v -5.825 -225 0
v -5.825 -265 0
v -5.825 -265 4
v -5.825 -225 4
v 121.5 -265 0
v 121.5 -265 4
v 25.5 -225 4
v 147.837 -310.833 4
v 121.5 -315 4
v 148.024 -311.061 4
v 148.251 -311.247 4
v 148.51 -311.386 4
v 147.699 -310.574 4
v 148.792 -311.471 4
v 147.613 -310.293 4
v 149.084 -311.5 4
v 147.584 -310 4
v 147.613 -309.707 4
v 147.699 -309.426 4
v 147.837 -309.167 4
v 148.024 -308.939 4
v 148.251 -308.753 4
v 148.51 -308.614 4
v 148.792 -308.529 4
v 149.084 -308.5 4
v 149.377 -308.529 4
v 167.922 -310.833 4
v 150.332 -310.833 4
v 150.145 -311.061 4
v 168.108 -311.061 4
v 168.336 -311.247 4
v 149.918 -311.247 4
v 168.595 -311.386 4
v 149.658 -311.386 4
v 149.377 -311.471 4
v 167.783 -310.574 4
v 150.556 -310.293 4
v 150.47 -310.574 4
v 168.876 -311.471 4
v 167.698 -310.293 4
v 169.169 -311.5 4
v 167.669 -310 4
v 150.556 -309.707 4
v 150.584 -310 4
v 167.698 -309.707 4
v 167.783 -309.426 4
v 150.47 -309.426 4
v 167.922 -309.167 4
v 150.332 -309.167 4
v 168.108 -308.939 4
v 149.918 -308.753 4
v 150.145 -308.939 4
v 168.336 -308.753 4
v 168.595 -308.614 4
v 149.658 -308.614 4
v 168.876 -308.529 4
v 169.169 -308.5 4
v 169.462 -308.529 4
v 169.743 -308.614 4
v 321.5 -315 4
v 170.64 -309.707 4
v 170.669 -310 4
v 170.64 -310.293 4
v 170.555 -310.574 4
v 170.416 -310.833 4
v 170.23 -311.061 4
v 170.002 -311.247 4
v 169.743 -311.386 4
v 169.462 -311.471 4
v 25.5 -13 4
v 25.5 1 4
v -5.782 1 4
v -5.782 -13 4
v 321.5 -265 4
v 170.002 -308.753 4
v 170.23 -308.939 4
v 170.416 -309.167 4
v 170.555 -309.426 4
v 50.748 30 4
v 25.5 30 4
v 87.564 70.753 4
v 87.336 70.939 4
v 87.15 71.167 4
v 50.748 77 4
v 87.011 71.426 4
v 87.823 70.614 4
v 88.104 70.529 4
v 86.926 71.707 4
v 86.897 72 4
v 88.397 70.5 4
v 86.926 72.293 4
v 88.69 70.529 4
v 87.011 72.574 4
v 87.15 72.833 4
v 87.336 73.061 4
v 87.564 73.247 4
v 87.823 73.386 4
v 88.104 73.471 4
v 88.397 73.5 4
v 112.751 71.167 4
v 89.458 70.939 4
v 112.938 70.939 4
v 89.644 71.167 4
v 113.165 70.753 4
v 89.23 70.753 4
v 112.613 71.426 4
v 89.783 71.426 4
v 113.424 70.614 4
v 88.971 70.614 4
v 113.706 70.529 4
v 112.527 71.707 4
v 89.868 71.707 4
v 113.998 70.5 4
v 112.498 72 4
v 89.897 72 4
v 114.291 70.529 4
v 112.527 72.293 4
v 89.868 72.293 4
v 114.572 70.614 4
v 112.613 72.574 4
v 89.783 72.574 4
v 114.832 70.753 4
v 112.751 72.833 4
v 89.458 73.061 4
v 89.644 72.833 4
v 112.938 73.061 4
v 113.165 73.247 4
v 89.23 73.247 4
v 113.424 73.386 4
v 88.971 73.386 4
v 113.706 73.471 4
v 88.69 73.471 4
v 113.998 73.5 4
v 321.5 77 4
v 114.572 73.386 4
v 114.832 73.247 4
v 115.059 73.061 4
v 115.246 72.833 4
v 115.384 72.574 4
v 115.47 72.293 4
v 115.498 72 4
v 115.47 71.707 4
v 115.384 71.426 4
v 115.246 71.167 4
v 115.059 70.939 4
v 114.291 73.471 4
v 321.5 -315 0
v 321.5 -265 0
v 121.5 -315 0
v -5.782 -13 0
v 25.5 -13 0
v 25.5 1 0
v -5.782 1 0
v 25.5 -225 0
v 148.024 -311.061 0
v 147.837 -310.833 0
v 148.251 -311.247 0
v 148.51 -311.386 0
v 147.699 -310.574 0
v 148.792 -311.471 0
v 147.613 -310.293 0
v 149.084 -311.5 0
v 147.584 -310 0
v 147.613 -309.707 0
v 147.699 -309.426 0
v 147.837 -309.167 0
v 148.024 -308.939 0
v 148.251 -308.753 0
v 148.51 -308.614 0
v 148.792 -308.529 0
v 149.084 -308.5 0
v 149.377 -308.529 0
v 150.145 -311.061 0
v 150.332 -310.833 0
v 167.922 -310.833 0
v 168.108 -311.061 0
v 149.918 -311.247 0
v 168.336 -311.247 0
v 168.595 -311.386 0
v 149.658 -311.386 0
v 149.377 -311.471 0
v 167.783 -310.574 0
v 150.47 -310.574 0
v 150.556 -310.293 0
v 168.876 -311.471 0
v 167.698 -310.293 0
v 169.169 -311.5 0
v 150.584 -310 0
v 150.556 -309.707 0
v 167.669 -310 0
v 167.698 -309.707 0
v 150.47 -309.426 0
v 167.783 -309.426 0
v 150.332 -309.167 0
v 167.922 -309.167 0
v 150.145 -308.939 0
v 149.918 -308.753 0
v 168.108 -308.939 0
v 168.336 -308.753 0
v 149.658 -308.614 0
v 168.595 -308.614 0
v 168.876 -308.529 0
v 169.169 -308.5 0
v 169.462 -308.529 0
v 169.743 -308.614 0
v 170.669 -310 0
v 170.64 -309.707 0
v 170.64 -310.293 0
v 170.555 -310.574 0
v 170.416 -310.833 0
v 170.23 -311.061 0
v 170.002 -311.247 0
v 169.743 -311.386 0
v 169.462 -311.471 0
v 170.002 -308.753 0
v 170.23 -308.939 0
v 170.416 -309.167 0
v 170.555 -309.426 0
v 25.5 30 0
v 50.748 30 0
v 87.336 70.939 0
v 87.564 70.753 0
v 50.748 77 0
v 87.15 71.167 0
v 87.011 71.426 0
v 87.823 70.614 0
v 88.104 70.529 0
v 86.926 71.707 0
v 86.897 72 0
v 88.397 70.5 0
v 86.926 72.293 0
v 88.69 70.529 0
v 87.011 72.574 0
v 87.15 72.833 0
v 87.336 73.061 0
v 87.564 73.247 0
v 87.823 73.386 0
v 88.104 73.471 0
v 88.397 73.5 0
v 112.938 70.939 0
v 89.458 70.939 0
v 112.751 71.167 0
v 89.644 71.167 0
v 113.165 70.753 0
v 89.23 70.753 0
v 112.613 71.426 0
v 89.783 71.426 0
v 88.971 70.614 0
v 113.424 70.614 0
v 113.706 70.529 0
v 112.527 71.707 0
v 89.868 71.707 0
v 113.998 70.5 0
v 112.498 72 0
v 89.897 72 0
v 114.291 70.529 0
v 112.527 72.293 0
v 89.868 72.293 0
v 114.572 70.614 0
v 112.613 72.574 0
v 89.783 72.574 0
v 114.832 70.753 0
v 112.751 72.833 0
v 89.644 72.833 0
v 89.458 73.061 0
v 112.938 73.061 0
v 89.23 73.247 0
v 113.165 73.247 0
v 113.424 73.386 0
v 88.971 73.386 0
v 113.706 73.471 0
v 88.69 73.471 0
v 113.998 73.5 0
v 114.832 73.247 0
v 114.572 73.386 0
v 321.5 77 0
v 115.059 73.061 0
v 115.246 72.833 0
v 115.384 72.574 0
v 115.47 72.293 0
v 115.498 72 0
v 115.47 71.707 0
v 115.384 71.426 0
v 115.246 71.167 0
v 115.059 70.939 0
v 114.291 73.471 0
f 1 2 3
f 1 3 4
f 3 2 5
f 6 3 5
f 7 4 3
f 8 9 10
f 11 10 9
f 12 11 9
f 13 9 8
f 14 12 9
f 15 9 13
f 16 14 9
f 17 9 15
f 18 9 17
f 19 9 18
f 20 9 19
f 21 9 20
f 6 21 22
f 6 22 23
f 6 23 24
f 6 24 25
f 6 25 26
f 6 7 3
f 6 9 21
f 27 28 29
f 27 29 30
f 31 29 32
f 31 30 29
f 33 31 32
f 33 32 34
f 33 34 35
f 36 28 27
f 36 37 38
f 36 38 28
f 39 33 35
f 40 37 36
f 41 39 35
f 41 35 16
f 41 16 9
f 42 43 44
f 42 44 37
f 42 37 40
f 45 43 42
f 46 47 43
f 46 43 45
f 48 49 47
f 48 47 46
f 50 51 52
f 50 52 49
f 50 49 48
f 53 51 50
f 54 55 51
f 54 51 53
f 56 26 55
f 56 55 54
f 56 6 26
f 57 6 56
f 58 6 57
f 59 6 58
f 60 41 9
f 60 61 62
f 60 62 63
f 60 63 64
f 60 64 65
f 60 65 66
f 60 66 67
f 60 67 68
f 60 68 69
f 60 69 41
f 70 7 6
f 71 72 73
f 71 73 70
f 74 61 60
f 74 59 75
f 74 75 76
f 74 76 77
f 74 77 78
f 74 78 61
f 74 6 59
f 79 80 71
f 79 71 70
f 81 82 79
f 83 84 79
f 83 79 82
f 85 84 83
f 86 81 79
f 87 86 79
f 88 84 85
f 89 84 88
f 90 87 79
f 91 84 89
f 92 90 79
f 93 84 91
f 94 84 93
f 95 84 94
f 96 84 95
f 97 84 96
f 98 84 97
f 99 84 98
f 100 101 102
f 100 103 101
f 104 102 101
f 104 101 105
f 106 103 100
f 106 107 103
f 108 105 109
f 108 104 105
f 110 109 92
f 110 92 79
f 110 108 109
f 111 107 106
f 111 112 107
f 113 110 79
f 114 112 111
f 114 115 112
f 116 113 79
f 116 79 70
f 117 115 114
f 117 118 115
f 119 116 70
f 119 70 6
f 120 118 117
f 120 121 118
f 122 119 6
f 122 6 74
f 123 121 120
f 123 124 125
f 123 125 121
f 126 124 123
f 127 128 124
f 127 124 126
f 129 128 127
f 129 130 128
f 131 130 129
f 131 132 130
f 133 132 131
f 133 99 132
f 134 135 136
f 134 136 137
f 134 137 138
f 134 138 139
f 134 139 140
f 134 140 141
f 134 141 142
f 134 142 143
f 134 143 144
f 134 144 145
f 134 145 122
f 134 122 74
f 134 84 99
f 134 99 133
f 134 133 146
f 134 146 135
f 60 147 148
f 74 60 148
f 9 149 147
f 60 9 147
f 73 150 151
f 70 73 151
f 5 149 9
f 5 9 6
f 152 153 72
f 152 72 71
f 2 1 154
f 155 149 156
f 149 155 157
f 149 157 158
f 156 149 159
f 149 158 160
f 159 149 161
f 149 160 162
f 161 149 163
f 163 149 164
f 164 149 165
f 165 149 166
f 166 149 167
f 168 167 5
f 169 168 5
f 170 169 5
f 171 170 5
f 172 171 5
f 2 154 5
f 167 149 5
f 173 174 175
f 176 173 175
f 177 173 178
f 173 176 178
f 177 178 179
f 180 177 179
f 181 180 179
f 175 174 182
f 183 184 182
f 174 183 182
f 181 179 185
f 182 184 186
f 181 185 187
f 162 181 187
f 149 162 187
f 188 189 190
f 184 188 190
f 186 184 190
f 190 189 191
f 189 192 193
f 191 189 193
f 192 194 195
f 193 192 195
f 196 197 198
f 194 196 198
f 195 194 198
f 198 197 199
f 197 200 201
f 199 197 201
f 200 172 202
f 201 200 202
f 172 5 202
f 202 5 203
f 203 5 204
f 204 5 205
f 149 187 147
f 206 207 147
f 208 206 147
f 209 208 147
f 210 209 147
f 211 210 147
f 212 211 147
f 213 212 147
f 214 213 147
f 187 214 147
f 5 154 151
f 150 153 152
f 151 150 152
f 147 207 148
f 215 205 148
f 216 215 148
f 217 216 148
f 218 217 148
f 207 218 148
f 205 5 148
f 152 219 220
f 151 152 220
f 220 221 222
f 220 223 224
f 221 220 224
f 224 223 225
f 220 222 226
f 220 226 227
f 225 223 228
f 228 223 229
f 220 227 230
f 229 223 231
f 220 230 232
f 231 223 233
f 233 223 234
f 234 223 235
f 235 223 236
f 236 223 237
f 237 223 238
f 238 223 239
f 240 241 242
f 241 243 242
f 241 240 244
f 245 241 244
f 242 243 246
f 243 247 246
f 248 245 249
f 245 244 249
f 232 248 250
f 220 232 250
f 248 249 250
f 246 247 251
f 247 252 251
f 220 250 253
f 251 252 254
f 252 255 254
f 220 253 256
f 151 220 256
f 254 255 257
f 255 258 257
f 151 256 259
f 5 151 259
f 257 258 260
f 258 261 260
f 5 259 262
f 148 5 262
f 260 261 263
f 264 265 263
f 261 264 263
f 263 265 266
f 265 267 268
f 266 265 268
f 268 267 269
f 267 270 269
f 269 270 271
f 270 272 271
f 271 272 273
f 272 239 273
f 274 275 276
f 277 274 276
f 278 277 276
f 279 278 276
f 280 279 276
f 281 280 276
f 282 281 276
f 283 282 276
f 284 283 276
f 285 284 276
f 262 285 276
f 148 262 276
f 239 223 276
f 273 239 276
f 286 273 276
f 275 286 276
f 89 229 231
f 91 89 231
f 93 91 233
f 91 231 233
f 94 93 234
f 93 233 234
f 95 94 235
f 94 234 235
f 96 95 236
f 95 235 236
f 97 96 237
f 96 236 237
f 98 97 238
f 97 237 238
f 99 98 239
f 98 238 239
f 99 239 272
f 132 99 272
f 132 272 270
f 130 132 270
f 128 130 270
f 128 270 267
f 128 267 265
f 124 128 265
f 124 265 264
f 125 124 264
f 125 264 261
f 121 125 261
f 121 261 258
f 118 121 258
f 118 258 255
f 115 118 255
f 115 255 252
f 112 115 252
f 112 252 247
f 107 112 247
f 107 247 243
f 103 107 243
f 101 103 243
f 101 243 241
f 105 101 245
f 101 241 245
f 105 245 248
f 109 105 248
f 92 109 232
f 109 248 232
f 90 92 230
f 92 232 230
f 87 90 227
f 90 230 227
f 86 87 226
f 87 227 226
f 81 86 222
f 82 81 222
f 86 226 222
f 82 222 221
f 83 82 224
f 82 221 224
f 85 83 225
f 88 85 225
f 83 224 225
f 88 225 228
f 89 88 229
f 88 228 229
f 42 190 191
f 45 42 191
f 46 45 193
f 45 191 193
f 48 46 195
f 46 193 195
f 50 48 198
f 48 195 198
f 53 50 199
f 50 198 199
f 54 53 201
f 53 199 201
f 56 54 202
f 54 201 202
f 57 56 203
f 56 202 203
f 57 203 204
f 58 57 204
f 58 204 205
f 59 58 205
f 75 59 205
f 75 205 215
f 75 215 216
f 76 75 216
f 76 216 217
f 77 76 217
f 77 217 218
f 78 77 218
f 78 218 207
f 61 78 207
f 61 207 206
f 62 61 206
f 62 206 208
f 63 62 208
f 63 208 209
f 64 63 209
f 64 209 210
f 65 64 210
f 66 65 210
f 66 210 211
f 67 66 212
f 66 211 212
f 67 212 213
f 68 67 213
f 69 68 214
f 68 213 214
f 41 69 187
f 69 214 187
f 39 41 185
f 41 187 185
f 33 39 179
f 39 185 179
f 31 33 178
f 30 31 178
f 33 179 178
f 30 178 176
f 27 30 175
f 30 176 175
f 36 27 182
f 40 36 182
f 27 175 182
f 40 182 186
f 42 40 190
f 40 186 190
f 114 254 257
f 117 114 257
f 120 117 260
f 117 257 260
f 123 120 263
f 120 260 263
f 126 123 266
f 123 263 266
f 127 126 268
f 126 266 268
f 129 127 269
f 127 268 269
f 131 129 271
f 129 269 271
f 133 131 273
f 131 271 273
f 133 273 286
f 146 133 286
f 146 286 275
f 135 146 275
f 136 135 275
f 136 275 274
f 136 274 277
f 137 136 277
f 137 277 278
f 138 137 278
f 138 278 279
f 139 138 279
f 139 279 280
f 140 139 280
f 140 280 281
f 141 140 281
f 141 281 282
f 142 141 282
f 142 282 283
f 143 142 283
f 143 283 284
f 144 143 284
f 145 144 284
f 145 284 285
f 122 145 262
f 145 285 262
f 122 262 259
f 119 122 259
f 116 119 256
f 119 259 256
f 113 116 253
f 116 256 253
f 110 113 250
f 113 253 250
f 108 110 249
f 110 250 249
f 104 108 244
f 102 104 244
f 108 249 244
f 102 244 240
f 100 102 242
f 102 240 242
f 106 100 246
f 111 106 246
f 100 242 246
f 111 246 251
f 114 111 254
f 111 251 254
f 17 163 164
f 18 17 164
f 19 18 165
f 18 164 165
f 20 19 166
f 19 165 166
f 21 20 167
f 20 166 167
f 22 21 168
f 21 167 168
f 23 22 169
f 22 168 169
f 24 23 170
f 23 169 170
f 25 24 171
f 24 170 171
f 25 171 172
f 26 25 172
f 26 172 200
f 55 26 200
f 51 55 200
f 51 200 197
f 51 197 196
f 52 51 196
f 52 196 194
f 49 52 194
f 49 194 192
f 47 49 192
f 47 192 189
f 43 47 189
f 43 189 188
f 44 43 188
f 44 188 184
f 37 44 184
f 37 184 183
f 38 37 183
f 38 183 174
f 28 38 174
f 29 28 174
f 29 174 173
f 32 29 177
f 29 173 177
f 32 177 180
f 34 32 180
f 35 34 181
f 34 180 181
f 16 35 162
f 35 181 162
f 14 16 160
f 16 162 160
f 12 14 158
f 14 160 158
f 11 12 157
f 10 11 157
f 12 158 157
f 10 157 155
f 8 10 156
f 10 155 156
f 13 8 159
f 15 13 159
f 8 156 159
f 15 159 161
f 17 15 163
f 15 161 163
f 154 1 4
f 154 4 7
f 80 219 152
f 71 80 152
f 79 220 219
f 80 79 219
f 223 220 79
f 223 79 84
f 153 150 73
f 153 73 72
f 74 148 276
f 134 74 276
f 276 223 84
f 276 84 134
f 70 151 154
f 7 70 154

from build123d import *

# Parameters (mm, degrees)
SKETCH1_W           = 31.282297403
SKETCH1_H           = 14
SKETCH1_W_2         = 31.32455923
SKETCH1_H_2         = 40
SKETCH1_W_3         = 270.751882141
SKETCH1_H_3         = 47
SKETCH1_W_4         = 200
SKETCH1_H_4         = 50
BOSS_EXTRUDE1_DEPTH = 4
SKETCH2_R           = 1.5
CUT_EXTRUDE1_DEPTH  = 451.114707602


with BuildPart() as part:
    # Sketch1 → Boss-Extrude1 (new body)
    with BuildSketch(Plane.XY):
        Polygon((25.5, 1), (25.5, -13), (25.5, -225), (25.5, -265), (65.632913627, -265), (121.5, -265), (321.5, -265), (321.5, 30), (50.748117859, 30), (25.5, 30), align=None)
        with Locations((9.858851298, -6)):
            Rectangle(SKETCH1_W, SKETCH1_H)
        with Locations((9.837720385, -245)):
            Rectangle(SKETCH1_W_2, SKETCH1_H_2)
        with Locations((186.124058929, 53.5)):
            Rectangle(SKETCH1_W_3, SKETCH1_H_3)
        with Locations((221.5, -290)):
            Rectangle(SKETCH1_W_4, SKETCH1_H_4)
    extrude(amount=BOSS_EXTRUDE1_DEPTH)

    # Sketch2 → Cut-Extrude1 (cut, through all)
    with BuildSketch(Plane(origin=(0, 0, 0), x_dir=(-1, 0, 0), z_dir=(0, 0, -1))):
        with Locations((-113.998383462, 72)):
            Circle(SKETCH2_R)
        with Locations((-88.397045893, 72)):
            Circle(SKETCH2_R)
        with Locations((-169.168895948, -310)):
            Circle(SKETCH2_R)
        with Locations((-149.084447974, -310)):
            Circle(SKETCH2_R)
    extrude(amount=-CUT_EXTRUDE1_DEPTH, mode=Mode.SUBTRACT)


solid = part.part
